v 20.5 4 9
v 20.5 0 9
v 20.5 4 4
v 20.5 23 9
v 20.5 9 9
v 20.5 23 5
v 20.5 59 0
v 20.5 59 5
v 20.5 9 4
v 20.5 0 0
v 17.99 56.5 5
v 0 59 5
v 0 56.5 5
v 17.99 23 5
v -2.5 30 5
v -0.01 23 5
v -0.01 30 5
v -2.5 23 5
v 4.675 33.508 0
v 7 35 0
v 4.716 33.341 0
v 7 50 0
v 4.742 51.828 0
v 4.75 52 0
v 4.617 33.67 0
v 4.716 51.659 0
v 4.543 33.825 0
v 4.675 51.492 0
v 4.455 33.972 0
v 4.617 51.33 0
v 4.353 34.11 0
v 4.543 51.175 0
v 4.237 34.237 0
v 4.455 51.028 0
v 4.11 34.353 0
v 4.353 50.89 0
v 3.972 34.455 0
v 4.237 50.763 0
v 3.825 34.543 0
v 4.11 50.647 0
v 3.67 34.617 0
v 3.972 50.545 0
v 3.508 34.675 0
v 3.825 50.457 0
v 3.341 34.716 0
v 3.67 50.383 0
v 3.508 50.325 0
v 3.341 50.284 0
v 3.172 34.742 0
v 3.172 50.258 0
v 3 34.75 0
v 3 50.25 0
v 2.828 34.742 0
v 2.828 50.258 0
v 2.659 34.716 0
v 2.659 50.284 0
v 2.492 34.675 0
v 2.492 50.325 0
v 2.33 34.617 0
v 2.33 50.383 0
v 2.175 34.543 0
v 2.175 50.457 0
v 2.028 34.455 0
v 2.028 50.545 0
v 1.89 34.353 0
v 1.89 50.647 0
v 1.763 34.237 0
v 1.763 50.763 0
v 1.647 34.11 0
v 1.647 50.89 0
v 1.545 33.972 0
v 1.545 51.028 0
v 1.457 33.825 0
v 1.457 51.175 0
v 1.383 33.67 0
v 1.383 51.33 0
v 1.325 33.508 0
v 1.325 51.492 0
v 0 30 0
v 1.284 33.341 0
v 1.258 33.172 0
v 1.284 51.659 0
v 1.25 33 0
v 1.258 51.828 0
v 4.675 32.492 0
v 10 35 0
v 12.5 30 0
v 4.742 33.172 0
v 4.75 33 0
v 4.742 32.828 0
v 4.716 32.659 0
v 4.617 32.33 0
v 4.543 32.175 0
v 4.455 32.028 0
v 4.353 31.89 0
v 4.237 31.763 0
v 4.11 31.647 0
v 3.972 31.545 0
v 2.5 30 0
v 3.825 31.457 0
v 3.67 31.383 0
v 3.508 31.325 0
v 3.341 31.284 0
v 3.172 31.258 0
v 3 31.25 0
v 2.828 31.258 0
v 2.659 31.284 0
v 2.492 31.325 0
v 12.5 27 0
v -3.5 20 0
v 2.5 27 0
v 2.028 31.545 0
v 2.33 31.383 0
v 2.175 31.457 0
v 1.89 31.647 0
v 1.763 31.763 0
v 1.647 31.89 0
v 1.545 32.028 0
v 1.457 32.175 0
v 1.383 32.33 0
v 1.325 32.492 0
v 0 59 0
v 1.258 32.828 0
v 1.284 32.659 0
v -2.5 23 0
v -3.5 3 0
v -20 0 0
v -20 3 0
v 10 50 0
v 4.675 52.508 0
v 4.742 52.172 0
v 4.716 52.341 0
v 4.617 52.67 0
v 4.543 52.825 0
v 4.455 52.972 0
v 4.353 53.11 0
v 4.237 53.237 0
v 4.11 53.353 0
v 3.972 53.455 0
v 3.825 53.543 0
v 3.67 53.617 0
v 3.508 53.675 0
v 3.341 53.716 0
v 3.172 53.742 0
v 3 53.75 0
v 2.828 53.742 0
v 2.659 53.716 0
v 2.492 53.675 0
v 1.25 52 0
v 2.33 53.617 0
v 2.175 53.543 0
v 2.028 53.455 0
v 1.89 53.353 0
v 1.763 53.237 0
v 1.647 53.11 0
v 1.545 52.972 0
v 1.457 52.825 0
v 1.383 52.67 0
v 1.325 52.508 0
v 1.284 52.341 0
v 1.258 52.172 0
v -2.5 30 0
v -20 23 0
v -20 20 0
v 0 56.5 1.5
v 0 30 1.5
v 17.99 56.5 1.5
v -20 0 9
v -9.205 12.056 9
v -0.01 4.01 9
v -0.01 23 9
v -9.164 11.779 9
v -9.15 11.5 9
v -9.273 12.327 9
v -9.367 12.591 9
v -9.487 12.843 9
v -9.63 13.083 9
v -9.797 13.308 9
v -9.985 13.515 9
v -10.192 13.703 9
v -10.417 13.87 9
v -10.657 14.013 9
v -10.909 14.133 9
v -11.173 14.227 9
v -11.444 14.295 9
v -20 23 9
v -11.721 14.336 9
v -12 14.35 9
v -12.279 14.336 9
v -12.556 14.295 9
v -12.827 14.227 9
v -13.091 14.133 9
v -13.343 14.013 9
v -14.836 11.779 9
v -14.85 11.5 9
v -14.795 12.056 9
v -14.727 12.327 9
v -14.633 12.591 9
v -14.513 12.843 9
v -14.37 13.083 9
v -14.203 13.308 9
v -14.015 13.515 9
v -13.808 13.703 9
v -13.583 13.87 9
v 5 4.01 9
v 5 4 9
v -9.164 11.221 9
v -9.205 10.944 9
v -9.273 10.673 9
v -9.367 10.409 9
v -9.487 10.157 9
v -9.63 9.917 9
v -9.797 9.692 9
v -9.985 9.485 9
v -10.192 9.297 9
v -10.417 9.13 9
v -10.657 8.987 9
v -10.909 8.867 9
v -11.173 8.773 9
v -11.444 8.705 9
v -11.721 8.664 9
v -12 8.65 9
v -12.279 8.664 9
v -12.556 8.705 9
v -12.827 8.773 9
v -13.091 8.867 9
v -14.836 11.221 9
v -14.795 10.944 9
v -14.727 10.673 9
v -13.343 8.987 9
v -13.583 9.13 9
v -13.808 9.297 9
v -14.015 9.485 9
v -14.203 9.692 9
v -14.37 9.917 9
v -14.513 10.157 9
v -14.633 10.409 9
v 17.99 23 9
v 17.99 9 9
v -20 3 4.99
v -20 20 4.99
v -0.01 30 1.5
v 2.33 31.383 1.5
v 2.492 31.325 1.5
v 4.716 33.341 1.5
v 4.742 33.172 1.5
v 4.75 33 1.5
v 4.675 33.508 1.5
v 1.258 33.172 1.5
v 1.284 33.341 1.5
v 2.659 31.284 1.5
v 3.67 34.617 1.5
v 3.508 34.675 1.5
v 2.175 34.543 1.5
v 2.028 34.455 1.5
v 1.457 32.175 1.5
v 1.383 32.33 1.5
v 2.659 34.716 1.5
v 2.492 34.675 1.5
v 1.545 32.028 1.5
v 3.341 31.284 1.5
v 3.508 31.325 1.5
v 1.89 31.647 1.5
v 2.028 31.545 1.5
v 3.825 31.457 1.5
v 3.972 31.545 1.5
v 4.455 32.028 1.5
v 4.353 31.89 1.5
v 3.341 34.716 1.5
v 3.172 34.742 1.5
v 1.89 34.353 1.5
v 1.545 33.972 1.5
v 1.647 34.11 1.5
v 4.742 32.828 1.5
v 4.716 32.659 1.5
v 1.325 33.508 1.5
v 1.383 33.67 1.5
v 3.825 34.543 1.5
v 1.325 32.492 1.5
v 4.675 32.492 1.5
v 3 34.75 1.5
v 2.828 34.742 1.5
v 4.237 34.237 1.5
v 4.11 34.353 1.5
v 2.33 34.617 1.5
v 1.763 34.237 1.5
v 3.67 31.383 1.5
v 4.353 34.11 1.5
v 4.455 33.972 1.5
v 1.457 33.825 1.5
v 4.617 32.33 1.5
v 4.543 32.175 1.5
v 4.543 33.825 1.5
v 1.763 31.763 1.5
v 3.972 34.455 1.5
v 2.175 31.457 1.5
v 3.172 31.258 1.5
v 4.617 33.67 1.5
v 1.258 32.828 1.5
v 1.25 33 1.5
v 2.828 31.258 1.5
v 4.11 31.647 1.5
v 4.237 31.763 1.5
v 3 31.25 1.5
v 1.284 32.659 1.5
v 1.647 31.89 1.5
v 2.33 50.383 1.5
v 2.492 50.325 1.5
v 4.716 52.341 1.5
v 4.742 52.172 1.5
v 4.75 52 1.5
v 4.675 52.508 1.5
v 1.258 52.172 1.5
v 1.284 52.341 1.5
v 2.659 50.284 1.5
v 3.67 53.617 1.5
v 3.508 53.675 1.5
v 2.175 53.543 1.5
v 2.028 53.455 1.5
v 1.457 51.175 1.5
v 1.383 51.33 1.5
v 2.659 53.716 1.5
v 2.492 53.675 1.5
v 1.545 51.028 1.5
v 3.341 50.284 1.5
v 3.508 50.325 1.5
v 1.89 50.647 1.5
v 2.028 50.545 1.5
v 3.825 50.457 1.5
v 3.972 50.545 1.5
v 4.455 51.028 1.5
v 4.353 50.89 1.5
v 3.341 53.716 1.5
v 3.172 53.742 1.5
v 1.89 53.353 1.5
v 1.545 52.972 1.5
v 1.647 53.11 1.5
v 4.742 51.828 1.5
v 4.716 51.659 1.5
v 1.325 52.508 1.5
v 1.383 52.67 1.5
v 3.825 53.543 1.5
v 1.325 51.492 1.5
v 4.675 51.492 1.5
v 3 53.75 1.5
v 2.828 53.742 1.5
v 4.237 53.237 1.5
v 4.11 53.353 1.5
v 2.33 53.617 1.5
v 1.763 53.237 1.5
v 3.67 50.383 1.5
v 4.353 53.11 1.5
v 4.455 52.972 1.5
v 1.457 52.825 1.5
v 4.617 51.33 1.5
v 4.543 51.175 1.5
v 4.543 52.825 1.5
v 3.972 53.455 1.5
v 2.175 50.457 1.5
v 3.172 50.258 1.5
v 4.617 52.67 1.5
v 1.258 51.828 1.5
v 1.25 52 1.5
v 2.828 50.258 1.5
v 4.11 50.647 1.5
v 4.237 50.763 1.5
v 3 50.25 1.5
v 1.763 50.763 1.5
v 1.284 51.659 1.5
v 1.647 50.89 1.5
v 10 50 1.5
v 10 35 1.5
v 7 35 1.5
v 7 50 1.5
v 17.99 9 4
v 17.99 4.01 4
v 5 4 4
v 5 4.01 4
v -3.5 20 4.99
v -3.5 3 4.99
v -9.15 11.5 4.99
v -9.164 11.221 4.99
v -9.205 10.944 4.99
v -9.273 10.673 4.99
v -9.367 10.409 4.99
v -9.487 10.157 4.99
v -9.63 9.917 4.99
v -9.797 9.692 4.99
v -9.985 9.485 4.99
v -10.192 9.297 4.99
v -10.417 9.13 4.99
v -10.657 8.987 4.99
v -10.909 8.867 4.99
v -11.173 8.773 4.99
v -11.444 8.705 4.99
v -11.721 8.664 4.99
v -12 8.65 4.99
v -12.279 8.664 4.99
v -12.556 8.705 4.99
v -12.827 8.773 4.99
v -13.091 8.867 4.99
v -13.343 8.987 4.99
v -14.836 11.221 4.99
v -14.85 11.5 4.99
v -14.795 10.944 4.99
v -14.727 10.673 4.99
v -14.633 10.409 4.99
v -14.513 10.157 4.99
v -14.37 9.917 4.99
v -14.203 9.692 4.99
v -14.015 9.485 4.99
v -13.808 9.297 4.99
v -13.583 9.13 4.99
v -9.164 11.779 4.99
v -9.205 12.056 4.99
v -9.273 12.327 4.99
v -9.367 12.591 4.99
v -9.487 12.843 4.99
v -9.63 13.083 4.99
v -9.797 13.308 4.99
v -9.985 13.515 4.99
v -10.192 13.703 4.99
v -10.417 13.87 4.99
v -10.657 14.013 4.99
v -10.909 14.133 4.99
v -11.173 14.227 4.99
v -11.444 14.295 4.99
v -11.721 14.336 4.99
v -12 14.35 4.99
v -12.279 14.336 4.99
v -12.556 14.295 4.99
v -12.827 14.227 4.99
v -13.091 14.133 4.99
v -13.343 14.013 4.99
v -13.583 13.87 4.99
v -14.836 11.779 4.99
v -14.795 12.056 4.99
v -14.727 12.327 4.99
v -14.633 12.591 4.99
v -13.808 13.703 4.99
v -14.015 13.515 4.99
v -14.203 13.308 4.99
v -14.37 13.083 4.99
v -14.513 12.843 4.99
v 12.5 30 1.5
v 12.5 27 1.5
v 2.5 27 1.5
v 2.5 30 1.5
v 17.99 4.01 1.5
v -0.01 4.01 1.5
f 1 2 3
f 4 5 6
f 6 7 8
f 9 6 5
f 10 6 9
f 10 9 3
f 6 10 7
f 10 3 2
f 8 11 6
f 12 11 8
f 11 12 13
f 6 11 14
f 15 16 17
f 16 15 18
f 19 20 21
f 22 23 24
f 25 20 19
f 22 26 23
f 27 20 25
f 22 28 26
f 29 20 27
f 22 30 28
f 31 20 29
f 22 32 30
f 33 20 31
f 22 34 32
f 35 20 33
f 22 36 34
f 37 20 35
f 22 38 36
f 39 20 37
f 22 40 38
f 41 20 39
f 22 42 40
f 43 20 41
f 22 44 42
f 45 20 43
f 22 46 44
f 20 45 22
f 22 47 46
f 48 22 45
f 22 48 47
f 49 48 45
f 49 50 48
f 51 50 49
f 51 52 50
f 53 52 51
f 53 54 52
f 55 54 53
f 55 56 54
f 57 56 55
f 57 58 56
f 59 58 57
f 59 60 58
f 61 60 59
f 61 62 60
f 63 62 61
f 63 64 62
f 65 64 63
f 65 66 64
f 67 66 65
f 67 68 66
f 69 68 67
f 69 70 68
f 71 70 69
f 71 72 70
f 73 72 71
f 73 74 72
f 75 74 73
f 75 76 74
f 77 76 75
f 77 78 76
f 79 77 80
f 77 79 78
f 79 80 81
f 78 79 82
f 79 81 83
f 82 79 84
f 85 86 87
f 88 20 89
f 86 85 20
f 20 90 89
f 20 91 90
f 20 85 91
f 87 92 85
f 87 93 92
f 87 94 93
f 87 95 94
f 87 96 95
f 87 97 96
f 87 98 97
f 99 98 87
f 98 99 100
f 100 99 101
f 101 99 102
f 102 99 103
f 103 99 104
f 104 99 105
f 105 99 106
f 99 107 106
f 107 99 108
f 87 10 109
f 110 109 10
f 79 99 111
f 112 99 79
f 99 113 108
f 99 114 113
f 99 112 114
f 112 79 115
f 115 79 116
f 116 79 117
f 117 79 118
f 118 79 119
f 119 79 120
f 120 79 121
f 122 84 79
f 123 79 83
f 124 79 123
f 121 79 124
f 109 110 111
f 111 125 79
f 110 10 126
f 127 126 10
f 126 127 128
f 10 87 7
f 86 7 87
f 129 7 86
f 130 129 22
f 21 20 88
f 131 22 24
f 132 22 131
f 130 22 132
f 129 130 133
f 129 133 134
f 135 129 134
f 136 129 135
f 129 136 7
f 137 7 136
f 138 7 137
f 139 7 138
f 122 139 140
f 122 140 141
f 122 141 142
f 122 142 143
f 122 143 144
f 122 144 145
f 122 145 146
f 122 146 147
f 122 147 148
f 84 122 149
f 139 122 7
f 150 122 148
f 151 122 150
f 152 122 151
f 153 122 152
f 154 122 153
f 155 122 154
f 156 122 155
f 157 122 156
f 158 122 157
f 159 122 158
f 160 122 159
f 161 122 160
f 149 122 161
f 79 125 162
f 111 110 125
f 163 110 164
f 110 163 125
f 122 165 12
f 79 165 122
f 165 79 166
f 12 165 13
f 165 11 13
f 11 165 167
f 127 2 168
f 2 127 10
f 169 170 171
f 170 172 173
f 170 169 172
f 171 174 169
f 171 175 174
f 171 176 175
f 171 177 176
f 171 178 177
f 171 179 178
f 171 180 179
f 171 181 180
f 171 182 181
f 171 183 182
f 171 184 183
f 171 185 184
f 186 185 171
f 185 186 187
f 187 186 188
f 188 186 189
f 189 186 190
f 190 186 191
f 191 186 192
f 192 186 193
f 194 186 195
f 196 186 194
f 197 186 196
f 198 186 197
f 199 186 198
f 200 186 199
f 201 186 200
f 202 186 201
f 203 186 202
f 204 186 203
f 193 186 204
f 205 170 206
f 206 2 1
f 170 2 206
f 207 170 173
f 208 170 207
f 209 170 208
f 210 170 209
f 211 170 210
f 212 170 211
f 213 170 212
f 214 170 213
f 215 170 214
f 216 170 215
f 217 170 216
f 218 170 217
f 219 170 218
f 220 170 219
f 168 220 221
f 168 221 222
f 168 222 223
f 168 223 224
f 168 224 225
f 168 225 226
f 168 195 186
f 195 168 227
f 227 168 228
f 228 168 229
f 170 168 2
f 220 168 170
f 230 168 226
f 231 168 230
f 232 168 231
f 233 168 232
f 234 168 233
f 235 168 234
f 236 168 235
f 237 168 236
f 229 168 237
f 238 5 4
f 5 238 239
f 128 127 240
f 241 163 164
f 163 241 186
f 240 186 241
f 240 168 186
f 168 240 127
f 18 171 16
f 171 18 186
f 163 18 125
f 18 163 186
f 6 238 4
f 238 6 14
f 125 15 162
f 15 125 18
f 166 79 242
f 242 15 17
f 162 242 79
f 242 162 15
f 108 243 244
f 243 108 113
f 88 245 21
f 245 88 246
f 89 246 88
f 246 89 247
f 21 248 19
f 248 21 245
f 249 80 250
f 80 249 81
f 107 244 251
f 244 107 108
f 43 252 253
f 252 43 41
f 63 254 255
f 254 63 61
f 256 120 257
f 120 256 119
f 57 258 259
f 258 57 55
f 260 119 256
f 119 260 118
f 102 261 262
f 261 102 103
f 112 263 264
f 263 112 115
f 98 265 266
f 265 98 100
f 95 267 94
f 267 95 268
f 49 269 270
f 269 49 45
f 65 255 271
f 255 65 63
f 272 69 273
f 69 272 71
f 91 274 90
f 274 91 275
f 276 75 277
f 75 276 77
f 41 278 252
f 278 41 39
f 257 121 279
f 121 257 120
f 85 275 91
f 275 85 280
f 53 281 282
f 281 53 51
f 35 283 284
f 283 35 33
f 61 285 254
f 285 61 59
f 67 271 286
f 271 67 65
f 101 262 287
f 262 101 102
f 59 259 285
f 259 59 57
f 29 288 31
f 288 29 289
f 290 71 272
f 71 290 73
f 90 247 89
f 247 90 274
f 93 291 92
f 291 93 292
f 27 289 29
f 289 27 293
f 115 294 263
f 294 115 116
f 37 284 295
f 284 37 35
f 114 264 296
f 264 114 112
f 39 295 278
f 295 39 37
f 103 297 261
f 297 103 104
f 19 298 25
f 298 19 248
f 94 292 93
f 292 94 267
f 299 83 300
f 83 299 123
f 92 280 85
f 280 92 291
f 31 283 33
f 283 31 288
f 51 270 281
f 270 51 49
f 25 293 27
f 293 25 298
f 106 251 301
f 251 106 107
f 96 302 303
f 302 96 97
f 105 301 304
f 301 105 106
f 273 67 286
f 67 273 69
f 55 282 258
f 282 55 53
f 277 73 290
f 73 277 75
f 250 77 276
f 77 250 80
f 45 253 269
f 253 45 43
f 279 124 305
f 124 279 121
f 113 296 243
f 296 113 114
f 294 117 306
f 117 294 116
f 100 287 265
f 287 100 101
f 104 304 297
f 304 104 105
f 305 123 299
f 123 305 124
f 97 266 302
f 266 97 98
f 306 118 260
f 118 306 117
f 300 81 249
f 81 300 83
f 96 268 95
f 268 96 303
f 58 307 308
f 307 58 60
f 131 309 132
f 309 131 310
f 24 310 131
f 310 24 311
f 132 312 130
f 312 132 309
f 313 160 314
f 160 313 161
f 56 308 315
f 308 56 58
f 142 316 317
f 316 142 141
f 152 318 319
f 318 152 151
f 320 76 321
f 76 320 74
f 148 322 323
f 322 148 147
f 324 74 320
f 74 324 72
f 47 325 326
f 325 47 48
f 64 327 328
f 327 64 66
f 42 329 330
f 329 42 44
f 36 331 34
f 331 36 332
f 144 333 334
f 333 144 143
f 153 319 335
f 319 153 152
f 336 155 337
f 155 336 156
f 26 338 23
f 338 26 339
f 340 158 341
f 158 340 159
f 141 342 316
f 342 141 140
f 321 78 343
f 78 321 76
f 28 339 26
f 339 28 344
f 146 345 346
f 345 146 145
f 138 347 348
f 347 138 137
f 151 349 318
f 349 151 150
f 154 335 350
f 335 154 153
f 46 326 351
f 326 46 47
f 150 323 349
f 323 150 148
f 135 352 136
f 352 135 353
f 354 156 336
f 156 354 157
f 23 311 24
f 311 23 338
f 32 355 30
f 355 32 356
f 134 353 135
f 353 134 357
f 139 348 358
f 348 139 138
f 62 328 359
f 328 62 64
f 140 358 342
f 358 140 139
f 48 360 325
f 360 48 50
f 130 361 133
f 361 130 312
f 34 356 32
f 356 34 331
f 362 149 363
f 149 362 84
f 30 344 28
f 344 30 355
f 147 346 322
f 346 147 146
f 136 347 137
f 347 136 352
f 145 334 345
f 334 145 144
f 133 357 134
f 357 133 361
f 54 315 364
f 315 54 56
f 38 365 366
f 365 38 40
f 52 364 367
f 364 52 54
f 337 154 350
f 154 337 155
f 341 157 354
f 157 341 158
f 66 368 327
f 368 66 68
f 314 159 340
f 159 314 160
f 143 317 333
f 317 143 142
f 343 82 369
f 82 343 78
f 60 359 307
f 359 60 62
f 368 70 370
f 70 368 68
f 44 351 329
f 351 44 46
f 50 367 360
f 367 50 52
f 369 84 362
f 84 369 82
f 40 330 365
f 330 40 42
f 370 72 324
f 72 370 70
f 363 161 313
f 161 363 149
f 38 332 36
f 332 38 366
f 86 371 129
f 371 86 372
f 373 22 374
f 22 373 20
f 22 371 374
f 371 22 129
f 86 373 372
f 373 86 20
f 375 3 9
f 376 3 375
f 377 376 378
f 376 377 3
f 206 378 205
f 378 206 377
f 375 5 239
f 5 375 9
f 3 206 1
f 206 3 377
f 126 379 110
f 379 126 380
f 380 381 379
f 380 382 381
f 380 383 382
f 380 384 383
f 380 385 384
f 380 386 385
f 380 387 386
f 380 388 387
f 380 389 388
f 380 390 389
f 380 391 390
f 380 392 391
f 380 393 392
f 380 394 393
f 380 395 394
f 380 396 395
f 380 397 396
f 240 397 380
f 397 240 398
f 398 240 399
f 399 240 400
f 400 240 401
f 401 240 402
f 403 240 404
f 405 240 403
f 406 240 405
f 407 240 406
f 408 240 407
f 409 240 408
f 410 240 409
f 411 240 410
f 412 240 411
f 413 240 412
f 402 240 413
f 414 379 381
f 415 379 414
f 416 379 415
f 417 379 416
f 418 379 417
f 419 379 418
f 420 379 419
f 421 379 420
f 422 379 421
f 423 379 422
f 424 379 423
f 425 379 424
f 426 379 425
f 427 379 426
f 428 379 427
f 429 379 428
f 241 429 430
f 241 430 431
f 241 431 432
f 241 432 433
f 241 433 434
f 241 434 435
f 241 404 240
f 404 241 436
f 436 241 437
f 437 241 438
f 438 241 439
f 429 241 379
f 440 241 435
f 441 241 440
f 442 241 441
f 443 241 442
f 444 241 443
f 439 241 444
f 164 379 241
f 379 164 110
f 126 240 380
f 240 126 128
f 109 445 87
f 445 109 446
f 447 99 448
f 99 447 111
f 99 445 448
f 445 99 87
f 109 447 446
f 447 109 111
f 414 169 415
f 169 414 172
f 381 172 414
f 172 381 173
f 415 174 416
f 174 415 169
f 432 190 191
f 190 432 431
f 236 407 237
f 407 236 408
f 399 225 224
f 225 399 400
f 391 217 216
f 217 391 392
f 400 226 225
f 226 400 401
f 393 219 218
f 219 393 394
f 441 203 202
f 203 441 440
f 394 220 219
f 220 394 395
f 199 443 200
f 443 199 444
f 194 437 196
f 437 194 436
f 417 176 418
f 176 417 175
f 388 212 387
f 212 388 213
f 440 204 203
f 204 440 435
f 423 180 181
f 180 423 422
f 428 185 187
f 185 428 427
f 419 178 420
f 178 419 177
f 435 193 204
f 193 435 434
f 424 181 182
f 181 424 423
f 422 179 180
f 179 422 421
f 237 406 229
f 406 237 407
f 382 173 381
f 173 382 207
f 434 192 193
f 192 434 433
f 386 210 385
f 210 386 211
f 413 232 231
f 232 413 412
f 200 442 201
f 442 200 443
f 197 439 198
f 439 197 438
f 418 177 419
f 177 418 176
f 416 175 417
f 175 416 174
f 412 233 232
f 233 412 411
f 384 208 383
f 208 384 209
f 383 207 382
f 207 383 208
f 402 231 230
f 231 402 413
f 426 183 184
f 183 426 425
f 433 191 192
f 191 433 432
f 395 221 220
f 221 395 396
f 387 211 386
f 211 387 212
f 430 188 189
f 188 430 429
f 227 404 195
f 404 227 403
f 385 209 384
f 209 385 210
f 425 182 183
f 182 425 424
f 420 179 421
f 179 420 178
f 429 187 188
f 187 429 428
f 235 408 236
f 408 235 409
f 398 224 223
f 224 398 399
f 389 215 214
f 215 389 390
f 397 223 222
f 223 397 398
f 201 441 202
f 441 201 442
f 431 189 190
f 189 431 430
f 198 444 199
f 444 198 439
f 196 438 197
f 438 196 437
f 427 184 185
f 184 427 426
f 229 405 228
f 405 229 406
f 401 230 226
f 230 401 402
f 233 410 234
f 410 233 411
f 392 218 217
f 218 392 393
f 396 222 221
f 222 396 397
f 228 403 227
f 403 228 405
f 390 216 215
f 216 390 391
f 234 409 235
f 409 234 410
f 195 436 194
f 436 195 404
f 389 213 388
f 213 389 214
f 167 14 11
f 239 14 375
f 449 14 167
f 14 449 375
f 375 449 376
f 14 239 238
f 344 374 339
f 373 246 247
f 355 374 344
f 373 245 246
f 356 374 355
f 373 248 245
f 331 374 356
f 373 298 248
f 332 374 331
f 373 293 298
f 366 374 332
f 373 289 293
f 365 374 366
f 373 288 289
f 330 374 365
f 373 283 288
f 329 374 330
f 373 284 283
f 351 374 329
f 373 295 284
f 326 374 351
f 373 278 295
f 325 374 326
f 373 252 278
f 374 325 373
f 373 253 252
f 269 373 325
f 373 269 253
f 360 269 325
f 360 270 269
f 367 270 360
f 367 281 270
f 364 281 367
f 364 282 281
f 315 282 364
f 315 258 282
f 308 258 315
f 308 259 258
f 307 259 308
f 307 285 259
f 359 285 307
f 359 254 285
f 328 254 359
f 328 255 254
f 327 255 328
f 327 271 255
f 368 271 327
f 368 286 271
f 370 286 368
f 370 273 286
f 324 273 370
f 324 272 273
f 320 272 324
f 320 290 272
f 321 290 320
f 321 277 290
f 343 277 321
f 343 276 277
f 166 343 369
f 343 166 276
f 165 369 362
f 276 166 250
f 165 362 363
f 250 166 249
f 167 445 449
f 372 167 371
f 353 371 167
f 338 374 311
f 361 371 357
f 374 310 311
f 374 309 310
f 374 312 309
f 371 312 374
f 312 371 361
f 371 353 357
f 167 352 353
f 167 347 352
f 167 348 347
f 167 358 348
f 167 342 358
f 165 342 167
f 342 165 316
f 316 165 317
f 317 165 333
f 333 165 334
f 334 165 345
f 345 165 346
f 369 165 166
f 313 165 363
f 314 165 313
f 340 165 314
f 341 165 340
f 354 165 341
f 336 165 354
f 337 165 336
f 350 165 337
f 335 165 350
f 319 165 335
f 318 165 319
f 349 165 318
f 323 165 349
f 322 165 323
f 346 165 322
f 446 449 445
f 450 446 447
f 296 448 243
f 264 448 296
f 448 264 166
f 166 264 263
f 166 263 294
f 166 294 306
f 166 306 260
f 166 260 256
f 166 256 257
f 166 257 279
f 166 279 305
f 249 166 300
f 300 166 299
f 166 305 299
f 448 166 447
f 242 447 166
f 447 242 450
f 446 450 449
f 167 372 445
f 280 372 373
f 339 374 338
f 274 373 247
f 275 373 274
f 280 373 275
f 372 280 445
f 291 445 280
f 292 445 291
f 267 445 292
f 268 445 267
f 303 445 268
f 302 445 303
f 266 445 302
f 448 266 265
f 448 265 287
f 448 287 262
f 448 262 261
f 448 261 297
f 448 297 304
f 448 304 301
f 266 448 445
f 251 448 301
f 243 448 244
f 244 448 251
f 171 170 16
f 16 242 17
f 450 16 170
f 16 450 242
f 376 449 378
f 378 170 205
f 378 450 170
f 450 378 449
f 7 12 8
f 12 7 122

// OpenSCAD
//import("/Users/carloshespanhol/Downloads/endstopy.stl");
/*
import("/Users/carloshespanhol/Downloads/HCY_Stop.stl");

color("blue")
cube([30,4,30]);
*/

$fn=64;

difference(){
    union(){
        cube([20.5,56.5,5]);
        
        translate([-20,0,0])
        cube([40.5,23,9]);

        translate([-2.5,0,0])
        cube([2.5,30,5]);
    }

    // Wire pass
    translate([5,4,4])
    cube([30,5,6]);
    
    translate([-30.5,3,-0.01])
    cube([27,17,5]);

    translate([0,29.5,0])
    union(){
        translate([3,3.5,-1])
        cylinder(h=10, d=3.5);

        translate([3,22.5,-1])
        cylinder(h=10, d=3.5);

        translate([7,5.5,-1])
        cube([3,15,10]);
    }    
    translate([2.5,27,-1])
    cube([10,3,10]);
    
    // 5mm screw
    translate([-12,11.5,0])
    cylinder(h=10, d=5.7);    
    
    translate([-0.01,4.01,1.5])
    cube([18,57.01,8]);

}

// End border
translate([0,56.5,0])
cube([20.5, 2.5,5]);
